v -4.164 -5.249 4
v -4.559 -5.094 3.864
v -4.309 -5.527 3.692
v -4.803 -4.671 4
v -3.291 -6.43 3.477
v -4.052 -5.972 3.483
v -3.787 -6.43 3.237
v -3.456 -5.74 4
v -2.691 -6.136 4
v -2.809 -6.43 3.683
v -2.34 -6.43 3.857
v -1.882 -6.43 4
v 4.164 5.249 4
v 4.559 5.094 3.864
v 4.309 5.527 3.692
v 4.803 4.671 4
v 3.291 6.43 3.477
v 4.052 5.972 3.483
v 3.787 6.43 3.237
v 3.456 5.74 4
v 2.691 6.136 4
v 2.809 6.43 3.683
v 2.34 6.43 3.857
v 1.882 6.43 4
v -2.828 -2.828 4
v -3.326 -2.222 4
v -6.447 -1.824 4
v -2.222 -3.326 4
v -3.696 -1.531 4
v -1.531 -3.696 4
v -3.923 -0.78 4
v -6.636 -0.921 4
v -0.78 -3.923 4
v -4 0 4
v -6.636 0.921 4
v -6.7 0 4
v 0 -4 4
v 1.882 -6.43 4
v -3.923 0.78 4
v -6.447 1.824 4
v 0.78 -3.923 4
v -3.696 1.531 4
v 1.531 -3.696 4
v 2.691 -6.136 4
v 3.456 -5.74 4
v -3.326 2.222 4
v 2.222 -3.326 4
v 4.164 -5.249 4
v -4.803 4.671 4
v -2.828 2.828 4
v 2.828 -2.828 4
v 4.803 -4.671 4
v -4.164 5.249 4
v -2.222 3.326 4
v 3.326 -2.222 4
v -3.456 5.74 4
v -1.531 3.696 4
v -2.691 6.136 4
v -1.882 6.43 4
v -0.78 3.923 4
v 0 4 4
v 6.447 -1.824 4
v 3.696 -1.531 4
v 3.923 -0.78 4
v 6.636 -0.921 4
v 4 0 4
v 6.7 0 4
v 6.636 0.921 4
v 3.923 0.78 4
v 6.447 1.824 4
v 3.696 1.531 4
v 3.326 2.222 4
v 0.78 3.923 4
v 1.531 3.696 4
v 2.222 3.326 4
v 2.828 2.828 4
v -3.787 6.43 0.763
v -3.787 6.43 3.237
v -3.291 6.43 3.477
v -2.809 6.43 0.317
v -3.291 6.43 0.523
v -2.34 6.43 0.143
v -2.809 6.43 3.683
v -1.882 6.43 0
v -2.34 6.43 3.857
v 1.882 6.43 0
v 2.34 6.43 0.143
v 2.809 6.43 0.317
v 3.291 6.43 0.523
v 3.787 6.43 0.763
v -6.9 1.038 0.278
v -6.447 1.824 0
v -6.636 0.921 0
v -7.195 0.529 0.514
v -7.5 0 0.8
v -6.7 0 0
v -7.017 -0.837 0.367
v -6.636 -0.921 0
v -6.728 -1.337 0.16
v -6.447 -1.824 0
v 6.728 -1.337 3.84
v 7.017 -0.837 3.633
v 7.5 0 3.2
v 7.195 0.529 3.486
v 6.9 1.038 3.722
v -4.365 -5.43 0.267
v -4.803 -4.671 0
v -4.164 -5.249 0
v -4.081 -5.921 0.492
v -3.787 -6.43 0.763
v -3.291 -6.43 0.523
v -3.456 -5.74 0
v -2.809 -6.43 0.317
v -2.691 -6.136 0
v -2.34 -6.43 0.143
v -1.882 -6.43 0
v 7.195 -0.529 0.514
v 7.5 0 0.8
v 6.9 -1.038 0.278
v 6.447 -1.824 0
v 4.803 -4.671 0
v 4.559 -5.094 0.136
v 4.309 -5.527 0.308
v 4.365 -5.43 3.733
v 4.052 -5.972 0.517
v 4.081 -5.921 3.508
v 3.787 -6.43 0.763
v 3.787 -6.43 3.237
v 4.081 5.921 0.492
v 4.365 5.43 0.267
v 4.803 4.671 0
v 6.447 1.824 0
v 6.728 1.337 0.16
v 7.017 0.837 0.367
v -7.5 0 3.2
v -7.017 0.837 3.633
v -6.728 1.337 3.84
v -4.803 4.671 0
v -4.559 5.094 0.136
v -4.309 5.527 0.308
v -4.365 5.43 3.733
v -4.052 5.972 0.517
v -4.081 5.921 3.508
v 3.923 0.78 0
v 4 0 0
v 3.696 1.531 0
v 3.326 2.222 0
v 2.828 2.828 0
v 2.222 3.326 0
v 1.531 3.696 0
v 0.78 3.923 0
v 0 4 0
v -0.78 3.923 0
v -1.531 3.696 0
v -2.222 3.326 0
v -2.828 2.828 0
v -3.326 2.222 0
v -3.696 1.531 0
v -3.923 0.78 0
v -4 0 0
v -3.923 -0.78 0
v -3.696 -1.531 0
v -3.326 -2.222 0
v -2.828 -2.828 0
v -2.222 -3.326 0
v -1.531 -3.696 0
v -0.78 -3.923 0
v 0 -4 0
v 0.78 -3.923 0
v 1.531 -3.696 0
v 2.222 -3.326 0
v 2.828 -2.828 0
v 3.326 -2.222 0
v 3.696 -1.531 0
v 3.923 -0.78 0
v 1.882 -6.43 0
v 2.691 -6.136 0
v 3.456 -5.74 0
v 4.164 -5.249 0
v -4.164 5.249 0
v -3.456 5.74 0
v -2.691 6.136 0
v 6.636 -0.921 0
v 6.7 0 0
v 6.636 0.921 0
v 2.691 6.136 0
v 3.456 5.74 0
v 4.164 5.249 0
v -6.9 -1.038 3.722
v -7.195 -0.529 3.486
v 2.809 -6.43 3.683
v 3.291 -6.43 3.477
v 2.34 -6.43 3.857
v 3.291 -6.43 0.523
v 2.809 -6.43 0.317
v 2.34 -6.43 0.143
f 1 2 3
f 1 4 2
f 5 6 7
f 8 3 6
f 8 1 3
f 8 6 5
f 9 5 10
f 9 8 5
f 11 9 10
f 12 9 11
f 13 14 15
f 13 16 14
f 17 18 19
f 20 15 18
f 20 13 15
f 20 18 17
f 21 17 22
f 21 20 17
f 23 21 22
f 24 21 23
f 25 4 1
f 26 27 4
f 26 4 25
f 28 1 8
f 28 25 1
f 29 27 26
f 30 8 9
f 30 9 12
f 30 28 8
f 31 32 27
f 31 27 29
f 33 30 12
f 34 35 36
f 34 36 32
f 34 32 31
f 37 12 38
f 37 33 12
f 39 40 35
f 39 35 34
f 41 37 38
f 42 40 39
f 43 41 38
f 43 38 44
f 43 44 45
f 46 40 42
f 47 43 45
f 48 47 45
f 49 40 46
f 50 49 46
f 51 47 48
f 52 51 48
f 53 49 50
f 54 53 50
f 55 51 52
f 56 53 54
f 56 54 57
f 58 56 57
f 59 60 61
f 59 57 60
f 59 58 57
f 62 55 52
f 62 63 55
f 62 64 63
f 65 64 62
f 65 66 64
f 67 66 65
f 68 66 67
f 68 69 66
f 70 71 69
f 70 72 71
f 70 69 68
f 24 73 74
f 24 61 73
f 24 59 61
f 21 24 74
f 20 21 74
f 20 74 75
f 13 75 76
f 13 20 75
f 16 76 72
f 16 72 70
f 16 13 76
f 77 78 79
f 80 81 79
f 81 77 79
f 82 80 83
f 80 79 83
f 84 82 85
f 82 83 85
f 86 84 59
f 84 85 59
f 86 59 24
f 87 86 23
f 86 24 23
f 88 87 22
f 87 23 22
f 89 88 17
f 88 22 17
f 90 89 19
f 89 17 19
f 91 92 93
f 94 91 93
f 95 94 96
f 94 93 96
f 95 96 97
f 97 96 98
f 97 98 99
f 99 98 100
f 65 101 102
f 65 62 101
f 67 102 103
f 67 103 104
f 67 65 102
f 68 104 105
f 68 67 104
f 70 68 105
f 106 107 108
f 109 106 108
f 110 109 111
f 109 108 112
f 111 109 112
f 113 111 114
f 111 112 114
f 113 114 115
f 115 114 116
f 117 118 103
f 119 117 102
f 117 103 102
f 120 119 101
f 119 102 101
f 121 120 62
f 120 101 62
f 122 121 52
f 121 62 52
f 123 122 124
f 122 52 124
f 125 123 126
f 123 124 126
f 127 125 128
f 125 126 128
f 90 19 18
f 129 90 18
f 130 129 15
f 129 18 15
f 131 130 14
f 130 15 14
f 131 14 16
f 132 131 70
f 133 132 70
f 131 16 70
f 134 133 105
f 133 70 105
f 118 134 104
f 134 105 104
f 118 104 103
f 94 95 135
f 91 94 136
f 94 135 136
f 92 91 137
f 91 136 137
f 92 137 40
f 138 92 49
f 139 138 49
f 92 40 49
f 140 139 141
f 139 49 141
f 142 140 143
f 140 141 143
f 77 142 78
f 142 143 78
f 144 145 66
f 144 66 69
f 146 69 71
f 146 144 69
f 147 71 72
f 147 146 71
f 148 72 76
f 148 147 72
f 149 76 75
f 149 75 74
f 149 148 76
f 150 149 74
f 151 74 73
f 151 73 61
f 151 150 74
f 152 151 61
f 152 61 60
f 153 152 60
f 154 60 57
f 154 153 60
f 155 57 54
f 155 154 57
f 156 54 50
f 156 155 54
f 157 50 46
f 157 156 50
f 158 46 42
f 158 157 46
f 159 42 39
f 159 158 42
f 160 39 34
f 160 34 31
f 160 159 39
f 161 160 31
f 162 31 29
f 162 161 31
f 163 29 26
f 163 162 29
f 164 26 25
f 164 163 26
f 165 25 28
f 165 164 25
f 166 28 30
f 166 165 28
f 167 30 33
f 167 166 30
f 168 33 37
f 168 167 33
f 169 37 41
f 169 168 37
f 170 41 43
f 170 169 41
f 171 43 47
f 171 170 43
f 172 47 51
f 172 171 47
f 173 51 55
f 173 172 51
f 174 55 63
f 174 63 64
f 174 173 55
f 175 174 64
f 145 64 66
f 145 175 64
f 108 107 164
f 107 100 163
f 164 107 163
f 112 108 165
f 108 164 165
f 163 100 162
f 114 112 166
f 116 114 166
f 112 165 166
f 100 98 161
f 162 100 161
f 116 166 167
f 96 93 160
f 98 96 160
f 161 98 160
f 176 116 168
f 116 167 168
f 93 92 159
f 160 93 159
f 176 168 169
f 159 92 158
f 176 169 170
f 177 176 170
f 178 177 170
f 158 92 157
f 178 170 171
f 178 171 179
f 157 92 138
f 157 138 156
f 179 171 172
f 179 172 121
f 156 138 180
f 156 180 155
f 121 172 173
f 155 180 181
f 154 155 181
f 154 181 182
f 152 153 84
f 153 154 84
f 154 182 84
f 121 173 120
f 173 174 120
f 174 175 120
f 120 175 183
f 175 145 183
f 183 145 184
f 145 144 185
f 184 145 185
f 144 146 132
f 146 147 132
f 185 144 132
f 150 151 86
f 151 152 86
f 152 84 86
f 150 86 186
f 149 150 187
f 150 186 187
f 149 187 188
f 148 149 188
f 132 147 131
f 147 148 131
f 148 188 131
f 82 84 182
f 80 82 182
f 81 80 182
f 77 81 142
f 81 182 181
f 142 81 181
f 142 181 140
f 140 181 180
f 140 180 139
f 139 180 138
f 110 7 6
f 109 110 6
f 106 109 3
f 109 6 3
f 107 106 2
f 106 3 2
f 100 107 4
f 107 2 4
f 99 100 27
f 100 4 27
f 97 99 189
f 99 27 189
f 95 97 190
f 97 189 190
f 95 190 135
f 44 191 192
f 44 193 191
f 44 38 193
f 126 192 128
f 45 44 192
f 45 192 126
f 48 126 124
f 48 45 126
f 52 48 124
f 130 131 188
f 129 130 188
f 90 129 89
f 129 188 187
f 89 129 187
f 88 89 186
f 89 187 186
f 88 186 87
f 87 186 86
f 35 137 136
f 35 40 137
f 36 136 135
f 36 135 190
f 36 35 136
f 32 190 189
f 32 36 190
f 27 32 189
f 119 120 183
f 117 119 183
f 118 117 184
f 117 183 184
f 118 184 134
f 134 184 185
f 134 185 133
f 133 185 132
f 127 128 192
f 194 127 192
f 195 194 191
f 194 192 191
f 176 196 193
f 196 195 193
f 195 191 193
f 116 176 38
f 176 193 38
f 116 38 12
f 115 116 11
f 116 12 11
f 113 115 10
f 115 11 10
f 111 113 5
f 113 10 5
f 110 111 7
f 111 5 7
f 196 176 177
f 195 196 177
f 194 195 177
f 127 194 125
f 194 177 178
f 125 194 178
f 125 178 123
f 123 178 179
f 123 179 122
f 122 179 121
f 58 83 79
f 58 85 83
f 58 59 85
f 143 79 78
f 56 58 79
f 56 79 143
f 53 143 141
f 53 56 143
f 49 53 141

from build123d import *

# Parameters (mm, degrees)
ESQUISSE1_R             = 7.5
ESQUISSE1_R_2           = 4
BASE_EXTRUSION_DEPTH    = 4
CHANFREIN1_SIZE         = 0.8
ESQUISSE2_W             = 18
ESQUISSE2_H             = 18
ENL_V_MAT_EXTRU_1_DEPTH = 4


with BuildPart() as part:
    # Esquisse1 → Base-Extrusion (new body)
    with BuildSketch(Plane.XY):
        Circle(ESQUISSE1_R)
        Circle(ESQUISSE1_R_2, mode=Mode.SUBTRACT)
    extrude(amount=BASE_EXTRUSION_DEPTH)

    # Chanfrein1
    chanfrein1_edges = [part.edges().sort_by_distance(p)[0] for p in [
        (-7.5, 0, 0),
        (-7.5, 0, 4),
    ]]
    chamfer(chanfrein1_edges, length=CHANFREIN1_SIZE)

    # Esquisse2 → Enlèv. mat.-Extru.1 (cut)
    with BuildSketch(Plane.XY.offset(4)):
        Rectangle(ESQUISSE2_W, ESQUISSE2_H)
        Polygon((-7.5, 0), (-3.787466677, 6.43029634), (3.787466677, 6.43029634), (7.5, 0), (3.787466677, -6.43029634), (-3.787466677, -6.43029634), align=None, mode=Mode.SUBTRACT)
    extrude(amount=-ENL_V_MAT_EXTRU_1_DEPTH, mode=Mode.SUBTRACT)


solid = part.part
